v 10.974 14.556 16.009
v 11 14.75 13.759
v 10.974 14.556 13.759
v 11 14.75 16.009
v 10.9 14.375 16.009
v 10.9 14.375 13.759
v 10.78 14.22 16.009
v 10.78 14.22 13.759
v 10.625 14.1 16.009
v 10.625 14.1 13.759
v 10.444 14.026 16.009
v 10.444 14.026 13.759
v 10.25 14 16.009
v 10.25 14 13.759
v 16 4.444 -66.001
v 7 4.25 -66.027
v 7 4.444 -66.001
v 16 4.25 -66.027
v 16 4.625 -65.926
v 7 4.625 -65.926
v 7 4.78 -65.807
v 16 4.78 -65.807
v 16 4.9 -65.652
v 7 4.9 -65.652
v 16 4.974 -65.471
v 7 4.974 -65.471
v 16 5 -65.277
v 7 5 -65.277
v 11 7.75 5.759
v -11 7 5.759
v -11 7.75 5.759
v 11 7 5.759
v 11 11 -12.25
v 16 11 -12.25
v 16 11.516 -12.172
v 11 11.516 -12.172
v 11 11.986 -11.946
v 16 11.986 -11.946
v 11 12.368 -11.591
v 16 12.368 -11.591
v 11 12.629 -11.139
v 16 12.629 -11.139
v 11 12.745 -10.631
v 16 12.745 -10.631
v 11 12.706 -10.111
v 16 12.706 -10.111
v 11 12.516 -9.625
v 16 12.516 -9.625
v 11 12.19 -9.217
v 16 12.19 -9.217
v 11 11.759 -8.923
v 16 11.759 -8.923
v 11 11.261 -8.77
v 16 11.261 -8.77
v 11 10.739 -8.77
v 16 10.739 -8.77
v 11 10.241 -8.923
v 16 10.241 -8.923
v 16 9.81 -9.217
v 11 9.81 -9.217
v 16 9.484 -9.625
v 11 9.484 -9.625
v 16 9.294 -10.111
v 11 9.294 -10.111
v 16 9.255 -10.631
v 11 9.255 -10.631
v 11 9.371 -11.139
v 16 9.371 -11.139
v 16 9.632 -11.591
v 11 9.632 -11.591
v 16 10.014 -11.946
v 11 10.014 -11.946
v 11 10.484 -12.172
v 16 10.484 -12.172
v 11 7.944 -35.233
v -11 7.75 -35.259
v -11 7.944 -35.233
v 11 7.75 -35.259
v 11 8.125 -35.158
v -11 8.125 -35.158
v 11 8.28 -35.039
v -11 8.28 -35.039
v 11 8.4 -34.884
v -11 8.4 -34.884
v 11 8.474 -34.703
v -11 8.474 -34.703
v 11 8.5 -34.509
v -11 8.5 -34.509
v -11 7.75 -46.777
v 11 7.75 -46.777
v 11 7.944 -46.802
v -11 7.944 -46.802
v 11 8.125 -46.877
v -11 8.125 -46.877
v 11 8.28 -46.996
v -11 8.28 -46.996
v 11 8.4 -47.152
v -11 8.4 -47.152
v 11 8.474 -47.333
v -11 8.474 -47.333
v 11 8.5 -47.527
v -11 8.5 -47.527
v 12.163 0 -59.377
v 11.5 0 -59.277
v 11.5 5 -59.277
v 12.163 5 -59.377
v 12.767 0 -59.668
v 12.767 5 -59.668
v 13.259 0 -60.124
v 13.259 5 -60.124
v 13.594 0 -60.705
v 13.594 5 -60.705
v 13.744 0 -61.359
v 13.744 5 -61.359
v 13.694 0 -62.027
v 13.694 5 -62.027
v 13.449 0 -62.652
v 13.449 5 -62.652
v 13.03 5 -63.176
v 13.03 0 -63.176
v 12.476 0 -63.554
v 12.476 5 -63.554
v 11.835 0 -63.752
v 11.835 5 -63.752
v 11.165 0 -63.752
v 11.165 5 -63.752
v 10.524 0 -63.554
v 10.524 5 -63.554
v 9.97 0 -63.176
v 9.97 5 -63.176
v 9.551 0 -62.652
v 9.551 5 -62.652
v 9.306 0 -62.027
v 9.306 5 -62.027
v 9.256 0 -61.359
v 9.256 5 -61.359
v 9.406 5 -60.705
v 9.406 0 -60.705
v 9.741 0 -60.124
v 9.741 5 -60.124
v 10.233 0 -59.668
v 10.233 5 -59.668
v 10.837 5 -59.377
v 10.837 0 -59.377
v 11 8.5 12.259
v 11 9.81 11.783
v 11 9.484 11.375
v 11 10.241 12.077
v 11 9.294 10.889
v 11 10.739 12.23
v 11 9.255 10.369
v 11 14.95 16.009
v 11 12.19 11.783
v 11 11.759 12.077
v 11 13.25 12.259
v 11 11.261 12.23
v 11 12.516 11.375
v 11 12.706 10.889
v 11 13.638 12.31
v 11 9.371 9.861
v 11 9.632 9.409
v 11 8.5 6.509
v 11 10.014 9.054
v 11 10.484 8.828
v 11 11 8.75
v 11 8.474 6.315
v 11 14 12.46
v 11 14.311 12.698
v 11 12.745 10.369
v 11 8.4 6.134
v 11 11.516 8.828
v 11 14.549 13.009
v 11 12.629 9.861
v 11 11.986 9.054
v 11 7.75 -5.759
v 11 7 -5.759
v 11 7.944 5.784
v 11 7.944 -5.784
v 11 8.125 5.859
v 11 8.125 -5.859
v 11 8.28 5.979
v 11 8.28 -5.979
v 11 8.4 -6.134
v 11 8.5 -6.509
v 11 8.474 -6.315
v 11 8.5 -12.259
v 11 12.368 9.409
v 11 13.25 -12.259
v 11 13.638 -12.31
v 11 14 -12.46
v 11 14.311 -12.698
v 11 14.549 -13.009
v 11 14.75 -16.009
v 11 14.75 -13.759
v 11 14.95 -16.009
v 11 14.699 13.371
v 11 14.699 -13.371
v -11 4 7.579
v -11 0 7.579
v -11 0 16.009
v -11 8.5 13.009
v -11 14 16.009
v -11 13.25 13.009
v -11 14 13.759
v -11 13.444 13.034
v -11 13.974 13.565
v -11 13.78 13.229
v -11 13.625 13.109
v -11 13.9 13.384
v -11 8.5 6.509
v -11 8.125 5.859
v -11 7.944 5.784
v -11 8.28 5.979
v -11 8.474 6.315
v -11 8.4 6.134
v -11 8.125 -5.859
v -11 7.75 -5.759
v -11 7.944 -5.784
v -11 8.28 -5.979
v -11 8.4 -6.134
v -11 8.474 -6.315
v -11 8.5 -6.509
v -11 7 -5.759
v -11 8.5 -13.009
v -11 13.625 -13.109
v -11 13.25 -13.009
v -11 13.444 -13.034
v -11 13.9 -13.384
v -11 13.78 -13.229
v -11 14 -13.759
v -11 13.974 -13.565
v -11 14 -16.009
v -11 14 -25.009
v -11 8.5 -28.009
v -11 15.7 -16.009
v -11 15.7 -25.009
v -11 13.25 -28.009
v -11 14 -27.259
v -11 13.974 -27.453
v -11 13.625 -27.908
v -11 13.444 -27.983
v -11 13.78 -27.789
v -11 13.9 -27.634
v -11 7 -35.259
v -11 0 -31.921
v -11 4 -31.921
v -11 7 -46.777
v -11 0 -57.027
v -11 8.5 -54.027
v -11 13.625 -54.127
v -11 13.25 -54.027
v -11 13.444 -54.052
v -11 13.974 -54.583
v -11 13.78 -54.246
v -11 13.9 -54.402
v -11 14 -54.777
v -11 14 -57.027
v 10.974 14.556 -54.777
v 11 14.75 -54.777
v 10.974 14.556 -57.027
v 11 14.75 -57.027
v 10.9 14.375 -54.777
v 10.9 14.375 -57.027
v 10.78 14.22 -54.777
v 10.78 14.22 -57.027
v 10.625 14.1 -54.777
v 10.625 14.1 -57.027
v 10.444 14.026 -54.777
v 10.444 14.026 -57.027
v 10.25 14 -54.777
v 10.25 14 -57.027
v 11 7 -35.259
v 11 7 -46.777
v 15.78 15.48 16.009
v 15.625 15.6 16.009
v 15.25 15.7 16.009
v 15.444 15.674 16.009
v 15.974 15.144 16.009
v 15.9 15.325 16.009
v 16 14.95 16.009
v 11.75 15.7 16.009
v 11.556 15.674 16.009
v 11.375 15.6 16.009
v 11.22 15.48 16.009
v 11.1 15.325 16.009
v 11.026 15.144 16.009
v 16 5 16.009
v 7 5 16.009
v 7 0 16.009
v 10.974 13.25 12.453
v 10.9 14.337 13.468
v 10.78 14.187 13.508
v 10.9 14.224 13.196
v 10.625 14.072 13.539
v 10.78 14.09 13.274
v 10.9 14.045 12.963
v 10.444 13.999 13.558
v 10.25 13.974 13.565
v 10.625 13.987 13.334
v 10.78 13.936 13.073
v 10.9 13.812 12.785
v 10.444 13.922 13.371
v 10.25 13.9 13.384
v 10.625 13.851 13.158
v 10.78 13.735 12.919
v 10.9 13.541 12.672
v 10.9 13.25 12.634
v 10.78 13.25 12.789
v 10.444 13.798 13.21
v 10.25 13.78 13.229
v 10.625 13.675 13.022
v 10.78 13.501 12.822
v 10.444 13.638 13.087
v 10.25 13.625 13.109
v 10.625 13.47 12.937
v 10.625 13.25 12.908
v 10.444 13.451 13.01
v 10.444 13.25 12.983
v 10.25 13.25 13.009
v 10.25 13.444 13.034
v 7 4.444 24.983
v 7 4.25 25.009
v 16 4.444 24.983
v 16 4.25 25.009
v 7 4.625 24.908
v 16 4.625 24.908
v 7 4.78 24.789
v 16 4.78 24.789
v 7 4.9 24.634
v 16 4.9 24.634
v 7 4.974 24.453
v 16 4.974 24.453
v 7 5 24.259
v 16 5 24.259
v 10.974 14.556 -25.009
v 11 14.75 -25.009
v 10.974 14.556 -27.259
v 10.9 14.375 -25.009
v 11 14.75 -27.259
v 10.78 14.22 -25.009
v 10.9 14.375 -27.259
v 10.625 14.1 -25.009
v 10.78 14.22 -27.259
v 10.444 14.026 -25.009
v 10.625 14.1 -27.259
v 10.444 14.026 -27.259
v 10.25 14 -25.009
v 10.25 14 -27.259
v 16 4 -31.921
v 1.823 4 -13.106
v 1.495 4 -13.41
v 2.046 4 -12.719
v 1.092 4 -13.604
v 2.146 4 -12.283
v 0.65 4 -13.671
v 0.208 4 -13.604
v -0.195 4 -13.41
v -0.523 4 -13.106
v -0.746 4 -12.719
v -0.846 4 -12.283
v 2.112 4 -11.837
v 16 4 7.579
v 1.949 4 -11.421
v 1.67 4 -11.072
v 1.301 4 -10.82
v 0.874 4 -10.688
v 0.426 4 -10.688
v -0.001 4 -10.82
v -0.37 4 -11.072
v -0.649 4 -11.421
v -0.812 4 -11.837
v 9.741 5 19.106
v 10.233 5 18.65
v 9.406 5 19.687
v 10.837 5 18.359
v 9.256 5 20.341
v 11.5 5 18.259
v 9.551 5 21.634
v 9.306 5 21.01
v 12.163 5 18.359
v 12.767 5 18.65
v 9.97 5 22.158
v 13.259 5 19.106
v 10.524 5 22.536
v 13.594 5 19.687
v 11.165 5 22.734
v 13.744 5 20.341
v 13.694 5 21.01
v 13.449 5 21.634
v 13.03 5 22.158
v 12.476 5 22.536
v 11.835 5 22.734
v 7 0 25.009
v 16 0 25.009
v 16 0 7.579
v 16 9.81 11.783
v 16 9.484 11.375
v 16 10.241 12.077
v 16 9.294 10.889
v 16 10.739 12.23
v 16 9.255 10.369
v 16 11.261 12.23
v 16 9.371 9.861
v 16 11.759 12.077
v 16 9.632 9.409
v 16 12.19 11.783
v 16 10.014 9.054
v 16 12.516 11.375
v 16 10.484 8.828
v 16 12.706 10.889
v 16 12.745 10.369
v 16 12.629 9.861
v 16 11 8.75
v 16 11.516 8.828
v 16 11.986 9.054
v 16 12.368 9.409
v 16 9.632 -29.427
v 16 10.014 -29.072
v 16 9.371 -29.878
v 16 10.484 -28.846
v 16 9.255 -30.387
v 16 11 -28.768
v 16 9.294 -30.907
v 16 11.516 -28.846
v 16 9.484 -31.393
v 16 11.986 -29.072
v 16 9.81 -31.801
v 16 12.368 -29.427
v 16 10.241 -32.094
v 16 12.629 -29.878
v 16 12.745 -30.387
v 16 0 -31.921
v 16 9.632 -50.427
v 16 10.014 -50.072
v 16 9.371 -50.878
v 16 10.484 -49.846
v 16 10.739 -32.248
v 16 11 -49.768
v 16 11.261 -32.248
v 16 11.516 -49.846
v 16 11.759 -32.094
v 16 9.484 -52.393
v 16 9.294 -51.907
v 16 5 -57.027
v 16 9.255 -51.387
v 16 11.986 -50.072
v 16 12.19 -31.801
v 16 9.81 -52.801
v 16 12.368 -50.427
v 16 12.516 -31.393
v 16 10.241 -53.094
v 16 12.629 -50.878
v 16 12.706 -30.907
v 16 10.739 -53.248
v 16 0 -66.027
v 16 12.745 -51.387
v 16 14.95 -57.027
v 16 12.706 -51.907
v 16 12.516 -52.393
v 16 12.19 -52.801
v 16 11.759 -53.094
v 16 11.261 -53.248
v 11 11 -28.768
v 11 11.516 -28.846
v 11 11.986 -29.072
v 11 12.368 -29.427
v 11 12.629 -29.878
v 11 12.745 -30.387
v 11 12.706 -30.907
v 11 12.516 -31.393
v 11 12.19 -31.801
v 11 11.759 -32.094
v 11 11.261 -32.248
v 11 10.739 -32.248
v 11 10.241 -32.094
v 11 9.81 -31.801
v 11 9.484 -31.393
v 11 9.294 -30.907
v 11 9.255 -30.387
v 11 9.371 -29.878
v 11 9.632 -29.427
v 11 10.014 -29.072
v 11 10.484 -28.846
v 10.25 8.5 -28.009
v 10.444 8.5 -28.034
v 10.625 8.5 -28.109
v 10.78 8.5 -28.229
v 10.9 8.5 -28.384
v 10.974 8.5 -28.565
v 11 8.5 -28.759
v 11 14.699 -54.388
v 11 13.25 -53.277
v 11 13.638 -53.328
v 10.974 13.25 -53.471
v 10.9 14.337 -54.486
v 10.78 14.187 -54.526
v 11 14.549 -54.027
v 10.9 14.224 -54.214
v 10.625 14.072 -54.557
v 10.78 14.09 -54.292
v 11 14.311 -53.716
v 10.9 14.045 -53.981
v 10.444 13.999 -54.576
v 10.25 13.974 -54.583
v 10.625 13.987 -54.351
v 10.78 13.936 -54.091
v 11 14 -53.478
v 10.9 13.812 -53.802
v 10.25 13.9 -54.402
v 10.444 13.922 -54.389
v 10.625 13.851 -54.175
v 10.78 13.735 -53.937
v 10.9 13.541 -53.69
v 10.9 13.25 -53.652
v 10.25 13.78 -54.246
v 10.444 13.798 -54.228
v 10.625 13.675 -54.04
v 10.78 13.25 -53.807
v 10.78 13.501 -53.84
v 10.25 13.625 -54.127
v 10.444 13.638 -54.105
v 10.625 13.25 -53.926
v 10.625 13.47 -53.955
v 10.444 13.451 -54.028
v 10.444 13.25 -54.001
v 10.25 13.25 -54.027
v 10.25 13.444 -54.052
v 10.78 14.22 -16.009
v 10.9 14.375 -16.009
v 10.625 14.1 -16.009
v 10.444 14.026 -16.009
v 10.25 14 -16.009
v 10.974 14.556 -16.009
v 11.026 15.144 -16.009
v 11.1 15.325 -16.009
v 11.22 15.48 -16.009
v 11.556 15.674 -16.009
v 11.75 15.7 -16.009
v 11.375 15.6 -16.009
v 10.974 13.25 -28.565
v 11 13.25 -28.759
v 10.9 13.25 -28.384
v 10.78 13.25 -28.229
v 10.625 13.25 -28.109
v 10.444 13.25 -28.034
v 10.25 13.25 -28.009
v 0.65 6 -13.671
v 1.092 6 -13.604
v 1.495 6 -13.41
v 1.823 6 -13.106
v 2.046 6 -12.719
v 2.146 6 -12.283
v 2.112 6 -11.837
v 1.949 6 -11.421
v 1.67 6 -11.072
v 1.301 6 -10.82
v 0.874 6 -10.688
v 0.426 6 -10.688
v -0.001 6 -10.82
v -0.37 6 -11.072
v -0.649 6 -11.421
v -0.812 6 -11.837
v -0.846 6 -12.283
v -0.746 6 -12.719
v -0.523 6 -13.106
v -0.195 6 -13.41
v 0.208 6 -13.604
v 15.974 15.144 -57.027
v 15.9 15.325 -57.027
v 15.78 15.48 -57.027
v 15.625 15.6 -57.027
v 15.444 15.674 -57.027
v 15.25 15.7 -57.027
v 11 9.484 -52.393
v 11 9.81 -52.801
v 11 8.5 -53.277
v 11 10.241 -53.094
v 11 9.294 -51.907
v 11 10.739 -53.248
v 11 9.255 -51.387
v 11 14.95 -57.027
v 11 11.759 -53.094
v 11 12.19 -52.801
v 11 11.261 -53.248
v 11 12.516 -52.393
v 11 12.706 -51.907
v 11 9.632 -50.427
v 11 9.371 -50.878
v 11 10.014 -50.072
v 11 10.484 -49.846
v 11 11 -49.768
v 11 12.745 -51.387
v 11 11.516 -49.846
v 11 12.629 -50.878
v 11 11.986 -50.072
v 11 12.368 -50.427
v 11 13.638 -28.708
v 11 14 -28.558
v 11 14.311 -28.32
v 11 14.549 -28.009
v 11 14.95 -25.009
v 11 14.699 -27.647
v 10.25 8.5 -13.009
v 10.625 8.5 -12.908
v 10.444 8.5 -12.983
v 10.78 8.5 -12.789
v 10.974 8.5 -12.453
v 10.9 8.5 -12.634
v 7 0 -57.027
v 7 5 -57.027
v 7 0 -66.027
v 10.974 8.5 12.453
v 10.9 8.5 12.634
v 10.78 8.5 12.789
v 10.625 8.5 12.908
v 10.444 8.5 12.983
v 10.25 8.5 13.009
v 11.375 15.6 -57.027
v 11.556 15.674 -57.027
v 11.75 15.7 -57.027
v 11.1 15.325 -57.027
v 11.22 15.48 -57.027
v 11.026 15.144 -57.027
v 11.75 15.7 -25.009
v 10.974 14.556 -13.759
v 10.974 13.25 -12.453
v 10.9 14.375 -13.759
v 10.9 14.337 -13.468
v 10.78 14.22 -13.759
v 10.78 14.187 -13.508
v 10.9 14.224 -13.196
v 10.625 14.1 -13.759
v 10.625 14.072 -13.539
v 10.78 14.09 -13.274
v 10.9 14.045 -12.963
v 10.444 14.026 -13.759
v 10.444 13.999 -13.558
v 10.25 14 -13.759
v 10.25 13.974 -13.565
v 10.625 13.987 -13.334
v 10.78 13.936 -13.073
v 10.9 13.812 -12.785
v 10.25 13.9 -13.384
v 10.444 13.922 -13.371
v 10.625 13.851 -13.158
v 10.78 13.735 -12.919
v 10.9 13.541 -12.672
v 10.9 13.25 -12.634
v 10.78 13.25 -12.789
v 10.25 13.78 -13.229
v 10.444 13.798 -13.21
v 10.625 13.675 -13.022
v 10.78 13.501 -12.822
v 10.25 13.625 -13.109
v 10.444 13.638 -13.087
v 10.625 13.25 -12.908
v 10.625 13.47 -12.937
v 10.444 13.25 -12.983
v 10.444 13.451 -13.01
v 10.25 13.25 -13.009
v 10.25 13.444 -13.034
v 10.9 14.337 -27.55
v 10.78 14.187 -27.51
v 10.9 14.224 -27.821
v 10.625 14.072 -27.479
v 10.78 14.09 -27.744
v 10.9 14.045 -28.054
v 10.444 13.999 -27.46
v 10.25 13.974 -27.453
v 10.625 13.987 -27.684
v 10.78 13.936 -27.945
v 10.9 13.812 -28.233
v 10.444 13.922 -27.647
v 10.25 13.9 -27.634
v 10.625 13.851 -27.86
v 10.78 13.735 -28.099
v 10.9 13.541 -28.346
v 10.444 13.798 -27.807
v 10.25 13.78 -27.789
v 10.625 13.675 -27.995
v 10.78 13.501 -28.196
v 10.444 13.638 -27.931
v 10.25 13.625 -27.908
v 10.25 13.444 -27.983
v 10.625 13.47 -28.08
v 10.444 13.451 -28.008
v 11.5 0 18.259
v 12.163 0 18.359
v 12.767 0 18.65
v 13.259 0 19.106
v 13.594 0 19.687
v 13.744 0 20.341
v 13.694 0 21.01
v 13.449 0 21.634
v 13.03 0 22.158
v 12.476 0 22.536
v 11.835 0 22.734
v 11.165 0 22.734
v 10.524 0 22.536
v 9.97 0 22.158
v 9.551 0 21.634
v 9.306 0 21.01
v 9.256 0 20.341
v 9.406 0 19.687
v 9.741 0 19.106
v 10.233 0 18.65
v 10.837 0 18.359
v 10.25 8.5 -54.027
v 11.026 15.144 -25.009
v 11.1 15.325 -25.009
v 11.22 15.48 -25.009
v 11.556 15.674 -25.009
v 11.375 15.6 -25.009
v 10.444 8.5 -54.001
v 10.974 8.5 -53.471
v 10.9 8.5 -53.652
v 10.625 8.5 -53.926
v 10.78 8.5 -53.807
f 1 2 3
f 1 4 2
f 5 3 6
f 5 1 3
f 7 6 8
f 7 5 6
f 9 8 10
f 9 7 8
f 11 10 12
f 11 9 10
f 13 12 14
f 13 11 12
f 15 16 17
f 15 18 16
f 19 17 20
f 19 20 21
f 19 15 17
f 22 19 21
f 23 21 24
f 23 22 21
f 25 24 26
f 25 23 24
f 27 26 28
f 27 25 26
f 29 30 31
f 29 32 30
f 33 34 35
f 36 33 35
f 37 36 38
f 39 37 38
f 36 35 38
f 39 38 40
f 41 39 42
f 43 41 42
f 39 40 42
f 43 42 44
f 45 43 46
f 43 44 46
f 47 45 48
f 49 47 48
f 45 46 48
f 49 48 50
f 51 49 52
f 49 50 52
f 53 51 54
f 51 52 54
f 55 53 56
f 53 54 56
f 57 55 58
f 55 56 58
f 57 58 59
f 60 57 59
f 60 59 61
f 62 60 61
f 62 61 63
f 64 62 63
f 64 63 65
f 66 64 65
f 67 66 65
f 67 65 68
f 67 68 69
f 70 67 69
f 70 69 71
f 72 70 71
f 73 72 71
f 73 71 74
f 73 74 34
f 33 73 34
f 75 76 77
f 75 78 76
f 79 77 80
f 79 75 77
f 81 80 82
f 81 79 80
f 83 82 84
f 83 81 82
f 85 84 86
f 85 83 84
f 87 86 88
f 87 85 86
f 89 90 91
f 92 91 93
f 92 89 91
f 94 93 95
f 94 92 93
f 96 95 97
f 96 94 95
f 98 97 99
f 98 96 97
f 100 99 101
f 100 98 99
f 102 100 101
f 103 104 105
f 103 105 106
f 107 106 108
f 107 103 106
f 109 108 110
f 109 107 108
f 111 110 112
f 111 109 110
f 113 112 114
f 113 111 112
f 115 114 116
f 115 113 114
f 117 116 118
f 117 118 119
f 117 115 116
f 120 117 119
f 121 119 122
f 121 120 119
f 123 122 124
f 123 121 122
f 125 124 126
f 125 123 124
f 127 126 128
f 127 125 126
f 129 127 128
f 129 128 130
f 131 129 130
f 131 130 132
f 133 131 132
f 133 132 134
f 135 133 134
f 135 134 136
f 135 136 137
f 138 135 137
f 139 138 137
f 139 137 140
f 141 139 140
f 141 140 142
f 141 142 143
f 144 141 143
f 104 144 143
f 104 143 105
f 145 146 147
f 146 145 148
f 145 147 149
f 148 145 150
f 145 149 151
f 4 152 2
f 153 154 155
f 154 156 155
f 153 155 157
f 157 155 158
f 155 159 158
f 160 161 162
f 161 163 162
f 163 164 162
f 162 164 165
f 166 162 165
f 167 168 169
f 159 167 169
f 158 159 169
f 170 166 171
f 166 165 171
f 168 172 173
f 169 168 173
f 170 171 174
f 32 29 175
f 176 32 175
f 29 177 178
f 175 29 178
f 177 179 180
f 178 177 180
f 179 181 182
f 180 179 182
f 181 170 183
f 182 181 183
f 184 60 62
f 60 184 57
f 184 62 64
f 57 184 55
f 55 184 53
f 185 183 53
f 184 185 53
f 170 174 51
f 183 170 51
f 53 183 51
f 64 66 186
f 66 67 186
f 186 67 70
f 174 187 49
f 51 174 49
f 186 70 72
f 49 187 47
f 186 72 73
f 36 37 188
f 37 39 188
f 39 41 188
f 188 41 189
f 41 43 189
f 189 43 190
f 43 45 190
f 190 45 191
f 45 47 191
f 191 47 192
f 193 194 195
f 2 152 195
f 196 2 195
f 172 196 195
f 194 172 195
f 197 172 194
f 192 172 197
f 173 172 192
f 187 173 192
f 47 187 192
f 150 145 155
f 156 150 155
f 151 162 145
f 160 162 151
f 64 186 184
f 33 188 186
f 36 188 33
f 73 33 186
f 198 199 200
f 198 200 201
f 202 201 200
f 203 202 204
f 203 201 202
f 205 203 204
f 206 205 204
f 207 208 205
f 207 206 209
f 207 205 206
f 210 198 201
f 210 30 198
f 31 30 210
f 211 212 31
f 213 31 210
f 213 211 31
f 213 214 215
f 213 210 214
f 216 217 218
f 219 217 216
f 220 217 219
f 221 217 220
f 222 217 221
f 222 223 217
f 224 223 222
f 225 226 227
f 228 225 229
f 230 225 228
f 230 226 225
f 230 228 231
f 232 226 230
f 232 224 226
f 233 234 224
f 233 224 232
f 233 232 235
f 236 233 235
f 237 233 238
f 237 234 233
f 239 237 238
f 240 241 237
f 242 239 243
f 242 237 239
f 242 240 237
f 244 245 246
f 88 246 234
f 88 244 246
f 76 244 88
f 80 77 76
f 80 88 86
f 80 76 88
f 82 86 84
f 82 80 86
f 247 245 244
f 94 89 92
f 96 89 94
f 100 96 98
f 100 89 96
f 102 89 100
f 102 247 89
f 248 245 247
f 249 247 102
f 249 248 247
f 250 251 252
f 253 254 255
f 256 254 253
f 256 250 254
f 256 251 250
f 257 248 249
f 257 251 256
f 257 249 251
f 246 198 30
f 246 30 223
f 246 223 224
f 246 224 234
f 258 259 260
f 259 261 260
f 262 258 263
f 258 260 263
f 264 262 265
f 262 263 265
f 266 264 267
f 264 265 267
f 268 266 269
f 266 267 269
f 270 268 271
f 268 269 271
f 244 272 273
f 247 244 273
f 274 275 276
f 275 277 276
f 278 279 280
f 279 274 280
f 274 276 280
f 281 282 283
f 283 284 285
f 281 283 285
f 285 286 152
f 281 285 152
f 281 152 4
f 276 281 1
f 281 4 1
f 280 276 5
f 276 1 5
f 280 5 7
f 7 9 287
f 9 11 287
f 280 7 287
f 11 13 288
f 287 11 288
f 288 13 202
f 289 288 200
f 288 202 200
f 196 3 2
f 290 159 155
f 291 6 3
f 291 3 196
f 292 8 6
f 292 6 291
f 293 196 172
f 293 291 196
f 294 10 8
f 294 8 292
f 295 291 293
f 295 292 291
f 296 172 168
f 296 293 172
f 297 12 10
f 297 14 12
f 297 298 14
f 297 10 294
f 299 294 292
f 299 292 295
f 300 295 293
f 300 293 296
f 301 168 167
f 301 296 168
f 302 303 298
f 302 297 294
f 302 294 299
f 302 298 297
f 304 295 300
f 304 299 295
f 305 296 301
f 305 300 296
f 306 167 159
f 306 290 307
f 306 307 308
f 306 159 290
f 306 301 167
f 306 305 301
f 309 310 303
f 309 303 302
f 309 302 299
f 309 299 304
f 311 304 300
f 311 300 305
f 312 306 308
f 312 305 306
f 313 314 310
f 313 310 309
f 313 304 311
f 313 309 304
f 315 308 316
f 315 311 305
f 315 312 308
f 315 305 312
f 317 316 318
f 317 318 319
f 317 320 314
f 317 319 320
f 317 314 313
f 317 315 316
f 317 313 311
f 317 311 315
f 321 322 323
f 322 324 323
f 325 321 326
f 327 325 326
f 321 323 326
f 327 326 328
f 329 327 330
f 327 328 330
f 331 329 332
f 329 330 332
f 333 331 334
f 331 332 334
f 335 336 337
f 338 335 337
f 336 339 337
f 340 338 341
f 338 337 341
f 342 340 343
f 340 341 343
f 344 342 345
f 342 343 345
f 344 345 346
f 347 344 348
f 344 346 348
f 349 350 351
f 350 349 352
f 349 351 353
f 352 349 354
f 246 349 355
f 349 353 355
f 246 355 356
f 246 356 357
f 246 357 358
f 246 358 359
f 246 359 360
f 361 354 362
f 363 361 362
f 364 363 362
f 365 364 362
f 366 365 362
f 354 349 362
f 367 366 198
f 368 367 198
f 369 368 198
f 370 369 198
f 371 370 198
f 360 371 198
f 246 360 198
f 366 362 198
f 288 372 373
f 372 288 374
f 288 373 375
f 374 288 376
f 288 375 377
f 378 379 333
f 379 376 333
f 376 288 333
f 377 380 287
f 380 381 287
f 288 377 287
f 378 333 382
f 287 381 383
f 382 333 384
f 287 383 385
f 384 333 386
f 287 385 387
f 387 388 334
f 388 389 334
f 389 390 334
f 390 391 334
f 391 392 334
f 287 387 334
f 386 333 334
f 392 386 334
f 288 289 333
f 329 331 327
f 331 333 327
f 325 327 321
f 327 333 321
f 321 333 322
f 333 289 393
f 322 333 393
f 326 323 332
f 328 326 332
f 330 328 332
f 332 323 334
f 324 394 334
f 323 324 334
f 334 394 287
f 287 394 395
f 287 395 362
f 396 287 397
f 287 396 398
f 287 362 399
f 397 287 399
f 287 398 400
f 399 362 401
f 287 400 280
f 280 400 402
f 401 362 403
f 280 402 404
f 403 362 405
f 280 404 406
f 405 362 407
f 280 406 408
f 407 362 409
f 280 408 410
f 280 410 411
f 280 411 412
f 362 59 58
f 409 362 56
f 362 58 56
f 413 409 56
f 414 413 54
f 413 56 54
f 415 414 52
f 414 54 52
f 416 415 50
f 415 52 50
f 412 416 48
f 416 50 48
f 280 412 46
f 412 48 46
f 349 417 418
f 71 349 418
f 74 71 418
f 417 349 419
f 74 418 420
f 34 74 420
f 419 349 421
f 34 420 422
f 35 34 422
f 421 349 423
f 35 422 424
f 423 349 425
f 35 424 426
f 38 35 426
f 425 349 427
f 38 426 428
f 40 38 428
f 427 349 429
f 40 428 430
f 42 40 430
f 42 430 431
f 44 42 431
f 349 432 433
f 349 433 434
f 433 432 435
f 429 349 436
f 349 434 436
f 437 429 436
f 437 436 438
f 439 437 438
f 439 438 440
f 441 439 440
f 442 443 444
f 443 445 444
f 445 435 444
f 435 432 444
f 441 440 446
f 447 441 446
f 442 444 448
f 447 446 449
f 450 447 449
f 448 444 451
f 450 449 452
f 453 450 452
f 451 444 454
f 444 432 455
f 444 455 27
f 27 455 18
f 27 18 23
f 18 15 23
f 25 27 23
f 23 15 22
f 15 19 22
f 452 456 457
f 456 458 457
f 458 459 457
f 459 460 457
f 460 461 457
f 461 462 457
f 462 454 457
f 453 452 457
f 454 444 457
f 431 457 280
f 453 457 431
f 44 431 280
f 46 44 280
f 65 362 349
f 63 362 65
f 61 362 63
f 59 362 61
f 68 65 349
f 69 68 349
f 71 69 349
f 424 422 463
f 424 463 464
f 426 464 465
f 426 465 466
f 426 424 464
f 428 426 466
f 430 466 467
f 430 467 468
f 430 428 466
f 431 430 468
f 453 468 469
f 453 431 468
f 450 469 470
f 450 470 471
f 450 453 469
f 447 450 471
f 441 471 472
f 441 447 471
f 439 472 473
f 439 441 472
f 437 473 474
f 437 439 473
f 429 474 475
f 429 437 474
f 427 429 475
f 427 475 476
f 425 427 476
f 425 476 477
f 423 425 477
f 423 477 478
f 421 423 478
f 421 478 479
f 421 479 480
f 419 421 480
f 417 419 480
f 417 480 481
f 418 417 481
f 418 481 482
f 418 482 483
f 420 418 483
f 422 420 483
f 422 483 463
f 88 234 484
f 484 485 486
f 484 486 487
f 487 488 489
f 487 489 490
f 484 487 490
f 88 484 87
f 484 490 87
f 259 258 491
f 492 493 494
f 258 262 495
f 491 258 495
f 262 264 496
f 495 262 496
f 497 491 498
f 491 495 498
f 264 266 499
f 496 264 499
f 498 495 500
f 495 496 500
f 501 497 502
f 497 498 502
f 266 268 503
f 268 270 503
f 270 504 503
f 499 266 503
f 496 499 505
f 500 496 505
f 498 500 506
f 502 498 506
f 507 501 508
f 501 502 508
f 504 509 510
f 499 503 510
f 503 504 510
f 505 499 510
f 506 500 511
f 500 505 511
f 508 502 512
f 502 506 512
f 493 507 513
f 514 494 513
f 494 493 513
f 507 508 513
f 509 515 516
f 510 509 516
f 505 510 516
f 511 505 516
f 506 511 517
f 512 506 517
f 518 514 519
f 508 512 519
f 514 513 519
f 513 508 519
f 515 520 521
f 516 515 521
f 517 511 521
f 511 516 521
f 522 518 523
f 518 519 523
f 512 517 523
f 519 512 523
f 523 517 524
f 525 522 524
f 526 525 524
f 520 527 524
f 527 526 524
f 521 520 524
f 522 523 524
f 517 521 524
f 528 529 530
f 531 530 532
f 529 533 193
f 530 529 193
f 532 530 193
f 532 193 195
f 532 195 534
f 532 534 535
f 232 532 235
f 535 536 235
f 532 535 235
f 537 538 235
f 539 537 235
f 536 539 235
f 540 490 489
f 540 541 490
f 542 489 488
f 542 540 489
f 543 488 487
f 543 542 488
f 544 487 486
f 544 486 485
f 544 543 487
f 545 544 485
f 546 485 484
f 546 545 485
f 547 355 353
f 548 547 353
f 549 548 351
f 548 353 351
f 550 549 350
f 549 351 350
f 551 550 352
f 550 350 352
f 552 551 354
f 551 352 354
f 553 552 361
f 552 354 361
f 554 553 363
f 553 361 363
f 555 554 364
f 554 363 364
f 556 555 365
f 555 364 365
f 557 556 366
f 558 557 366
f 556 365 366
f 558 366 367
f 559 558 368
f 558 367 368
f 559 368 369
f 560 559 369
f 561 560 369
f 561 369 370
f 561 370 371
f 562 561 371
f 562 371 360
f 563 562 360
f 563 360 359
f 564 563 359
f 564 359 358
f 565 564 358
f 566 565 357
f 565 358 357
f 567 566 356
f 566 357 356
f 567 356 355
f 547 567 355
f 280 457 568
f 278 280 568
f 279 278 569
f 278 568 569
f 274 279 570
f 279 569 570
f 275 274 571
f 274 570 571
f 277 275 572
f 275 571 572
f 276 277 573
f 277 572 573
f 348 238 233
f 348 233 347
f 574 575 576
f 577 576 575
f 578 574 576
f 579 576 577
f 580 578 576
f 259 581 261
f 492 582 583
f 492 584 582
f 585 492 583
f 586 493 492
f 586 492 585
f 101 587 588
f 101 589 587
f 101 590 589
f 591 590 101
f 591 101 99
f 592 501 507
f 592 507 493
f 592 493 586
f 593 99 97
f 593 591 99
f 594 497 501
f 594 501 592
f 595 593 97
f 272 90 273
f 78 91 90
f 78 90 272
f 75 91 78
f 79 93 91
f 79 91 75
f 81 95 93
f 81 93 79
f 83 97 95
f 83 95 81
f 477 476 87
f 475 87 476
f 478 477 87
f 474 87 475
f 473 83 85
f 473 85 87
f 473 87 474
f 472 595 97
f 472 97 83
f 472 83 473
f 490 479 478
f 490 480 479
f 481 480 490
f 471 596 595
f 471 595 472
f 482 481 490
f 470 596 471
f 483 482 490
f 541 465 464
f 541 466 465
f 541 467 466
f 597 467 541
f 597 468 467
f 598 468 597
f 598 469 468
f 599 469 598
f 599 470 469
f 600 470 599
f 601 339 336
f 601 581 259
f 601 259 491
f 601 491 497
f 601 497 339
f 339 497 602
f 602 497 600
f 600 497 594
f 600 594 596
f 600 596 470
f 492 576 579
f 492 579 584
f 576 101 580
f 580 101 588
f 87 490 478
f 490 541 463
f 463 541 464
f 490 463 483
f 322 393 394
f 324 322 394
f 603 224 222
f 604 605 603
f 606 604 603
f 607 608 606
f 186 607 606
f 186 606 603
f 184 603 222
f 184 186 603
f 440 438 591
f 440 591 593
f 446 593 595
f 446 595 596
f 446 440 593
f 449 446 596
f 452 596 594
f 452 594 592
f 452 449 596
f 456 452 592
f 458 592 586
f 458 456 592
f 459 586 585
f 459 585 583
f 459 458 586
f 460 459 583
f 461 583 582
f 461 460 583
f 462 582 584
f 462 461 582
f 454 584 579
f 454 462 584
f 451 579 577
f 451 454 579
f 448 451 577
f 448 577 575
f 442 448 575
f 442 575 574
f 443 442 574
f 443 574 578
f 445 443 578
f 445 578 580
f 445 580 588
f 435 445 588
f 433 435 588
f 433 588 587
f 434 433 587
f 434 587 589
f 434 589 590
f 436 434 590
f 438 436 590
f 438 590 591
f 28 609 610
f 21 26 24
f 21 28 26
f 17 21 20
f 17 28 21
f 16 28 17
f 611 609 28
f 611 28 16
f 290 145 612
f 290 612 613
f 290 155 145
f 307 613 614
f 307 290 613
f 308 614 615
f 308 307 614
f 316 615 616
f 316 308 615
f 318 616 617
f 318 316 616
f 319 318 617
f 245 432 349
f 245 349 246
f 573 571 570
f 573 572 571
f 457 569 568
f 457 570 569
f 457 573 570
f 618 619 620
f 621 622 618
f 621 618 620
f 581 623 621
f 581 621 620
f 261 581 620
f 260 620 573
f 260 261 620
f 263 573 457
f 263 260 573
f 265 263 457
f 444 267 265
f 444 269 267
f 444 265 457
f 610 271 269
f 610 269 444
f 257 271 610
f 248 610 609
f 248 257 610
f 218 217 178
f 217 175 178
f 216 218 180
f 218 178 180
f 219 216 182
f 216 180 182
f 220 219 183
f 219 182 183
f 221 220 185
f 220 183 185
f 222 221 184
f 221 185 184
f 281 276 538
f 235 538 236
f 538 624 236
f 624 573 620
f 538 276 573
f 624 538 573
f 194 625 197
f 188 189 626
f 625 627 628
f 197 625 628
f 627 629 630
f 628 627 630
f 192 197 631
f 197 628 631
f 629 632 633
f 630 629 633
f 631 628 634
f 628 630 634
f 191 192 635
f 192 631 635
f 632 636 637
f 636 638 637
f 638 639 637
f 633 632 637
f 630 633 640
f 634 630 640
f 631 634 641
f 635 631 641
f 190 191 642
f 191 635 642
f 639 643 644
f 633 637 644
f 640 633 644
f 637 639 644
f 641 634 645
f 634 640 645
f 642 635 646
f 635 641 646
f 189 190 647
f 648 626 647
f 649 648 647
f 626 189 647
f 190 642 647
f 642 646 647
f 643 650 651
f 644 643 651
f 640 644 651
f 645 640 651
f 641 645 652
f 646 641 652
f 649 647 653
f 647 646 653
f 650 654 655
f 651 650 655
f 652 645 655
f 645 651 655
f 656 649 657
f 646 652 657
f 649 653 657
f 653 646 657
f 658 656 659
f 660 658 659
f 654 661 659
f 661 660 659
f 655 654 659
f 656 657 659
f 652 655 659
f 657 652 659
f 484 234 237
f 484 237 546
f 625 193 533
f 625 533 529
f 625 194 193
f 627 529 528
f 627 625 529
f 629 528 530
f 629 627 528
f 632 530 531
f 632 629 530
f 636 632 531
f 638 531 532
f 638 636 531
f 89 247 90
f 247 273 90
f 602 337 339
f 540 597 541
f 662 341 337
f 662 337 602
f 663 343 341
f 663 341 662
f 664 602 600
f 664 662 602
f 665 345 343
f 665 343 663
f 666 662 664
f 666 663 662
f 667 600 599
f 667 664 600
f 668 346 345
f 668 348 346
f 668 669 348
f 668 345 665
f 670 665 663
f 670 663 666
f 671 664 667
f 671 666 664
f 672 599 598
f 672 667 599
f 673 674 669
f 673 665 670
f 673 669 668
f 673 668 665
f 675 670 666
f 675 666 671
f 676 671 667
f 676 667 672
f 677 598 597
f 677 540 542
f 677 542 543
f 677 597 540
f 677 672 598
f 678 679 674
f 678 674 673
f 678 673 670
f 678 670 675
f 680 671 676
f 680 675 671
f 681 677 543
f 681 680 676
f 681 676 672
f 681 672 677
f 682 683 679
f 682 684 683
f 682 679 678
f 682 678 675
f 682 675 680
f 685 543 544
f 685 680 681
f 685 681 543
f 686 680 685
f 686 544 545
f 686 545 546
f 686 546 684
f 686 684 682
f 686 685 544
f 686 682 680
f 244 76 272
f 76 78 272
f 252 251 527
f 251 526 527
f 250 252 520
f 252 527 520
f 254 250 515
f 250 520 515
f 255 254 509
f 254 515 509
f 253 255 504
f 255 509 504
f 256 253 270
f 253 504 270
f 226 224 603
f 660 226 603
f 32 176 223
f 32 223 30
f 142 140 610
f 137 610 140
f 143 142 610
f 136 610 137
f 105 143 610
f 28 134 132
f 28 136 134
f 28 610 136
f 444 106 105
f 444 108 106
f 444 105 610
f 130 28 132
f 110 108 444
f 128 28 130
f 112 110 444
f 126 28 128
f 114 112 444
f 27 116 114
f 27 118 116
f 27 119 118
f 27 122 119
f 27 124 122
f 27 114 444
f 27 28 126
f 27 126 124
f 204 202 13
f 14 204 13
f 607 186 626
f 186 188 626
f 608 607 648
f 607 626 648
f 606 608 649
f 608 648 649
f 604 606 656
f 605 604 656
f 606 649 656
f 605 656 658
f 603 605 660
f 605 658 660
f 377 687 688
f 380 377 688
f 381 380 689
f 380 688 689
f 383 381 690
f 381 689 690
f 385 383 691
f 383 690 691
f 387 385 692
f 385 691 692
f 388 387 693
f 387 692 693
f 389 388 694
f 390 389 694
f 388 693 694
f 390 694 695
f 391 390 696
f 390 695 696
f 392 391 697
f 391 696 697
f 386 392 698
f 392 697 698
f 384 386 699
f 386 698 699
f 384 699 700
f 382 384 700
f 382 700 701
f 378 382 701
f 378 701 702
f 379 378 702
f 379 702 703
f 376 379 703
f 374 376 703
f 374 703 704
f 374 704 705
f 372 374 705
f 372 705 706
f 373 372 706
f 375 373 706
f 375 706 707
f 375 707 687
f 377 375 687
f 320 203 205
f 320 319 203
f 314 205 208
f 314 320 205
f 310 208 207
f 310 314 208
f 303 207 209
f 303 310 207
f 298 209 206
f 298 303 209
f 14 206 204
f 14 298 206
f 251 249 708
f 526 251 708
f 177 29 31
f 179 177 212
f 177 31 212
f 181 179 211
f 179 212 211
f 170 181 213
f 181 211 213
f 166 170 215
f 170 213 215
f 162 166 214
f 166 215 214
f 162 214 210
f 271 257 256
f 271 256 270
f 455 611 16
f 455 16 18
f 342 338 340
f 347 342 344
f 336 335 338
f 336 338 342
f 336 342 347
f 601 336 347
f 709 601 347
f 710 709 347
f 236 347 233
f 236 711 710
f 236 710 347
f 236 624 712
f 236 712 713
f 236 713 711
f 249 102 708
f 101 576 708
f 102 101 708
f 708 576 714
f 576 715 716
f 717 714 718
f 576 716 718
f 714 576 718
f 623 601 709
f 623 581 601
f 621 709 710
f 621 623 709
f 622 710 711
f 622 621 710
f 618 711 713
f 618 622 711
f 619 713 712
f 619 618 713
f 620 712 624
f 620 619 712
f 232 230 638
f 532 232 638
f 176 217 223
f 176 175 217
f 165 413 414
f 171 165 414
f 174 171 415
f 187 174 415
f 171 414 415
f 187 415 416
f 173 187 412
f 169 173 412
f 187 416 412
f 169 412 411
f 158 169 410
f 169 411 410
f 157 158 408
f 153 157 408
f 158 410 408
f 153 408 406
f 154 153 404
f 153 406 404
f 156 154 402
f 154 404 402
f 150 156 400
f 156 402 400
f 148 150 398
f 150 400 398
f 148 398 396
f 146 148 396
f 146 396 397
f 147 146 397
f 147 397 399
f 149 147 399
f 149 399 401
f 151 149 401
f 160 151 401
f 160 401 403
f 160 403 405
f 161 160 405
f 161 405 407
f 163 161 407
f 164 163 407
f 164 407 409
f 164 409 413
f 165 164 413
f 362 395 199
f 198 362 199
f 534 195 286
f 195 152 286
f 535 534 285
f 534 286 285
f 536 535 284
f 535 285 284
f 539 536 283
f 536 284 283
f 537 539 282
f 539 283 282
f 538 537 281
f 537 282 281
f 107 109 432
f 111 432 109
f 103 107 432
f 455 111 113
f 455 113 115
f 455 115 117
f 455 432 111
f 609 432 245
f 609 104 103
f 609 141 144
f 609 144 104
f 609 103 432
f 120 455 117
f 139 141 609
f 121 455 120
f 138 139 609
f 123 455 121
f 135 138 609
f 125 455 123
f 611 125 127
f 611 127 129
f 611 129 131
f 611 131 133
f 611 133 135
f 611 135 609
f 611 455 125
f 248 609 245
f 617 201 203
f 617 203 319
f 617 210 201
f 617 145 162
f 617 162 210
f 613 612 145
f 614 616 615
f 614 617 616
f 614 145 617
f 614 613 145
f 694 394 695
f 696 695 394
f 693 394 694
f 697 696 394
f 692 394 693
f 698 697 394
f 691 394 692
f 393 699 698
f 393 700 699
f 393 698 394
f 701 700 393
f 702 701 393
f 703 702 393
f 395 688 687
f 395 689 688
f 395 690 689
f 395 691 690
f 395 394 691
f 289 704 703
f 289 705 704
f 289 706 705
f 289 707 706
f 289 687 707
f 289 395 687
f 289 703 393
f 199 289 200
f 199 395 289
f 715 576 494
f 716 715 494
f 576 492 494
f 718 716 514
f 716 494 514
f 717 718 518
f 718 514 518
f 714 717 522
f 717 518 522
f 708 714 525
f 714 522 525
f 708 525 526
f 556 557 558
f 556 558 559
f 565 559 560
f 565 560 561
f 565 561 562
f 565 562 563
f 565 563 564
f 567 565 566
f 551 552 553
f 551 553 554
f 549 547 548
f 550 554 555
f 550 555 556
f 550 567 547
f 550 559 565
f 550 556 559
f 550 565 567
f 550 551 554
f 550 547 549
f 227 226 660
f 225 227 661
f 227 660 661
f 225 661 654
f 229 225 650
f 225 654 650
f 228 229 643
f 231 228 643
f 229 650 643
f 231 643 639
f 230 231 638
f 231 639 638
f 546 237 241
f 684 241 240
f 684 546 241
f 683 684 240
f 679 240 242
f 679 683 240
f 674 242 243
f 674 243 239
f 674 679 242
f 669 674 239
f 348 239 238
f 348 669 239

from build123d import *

# Parameters (mm, degrees)
BOSS_EXTRUDE1_DEPTH = 11
SKETCH3_W           = 22
SKETCH3_H           = 3
BOSS_EXTRUDE2_DEPTH = 14
BOSS_EXTRUDE3_DEPTH = 5
SKETCH5_R           = 1.75
CUT_EXTRUDE1_DEPTH  = 36.096650541
SKETCH6_W           = 9
SKETCH6_H           = 9
BOSS_EXTRUDE4_DEPTH = 5
SKETCH10_R          = 2.25
CUT_EXTRUDE2_DEPTH  = 34.584744739
SKETCH8_W           = 27
SKETCH8_H           = 15.7
BOSS_EXTRUDE5_DEPTH = 4.5
FILLET1_R           = 0.75
CUT_EXTRUDE3_DEPTH  = 4
SKETCH12_R          = 1.5
CUT_EXTRUDE4_DEPTH  = 2


with BuildPart() as part:
    # Sketch1 → Boss-Extrude1 (new, symmetric)
    with BuildSketch(Plane(origin=(0, 0, 0), x_dir=(0, 0, -1), z_dir=(1, 0, 0))):
        Polygon((-13.0089, 0), (13.0089, 0), (13.0089, 8.5), (5.7589, 8.5), (5.7589, 7), (-5.7589, 7), (-5.7589, 8.5), (-13.0089, 8.5), align=None)
    extrude(amount=BOSS_EXTRUDE1_DEPTH, both=True)

    # Sketch3 → Boss-Extrude2 (add)
    with BuildSketch(Plane.XZ):
        with Locations((0, -14.5089)):
            Rectangle(SKETCH3_W, SKETCH3_H)
        with Locations((0, 14.5089)):
            Rectangle(SKETCH3_W, SKETCH3_H)
    extrude(amount=-BOSS_EXTRUDE2_DEPTH)

    # Sketch4 → Boss-Extrude3 (add)
    with BuildSketch(Plane(origin=(11, 0, 0), x_dir=(0, 0, -1), z_dir=(1, 0, 0))):
        Polygon((-8.8, 15.7), (-16.0089, 15.7), (-16.0089, 0), (16.0089, 0), (16.0089, 15.7), align=None)
    extrude(amount=BOSS_EXTRUDE3_DEPTH)

    # Sketch5 → Cut-Extrude1 (cut, through all)
    with BuildSketch(Plane(origin=(16, 0, 0), x_dir=(0, 0, -1), z_dir=(1, 0, 0))):
        with Locations((-10.5, 11)):
            Circle(SKETCH5_R)
        with Locations((10.5, 11)):
            Circle(SKETCH5_R)
    extrude(amount=-CUT_EXTRUDE1_DEPTH, mode=Mode.SUBTRACT)

    # Sketch6 → Boss-Extrude4 (add)
    with BuildSketch(Plane.XZ):
        with Locations((11.5, 20.5089)):
            Rectangle(SKETCH6_W, SKETCH6_H)
    extrude(amount=-BOSS_EXTRUDE4_DEPTH)

    # Sketch10 → Cut-Extrude2 (cut, through all)
    with BuildSketch(Plane.XZ):
        with Locations(Location((11.5, 20.5089, 0), (0, 0, 270))):
            Circle(SKETCH10_R)
    extrude(amount=-CUT_EXTRUDE2_DEPTH, mode=Mode.SUBTRACT)

    # Sketch8 → Boss-Extrude5 (add)
    with BuildSketch(Plane(origin=(0, 0, -16.0089), x_dir=(-1, 0, 0), z_dir=(0, 0, -1))):
        with Locations((-2.5, 7.85)):
            Rectangle(SKETCH8_W, SKETCH8_H)
    extrude(amount=BOSS_EXTRUDE5_DEPTH)

    # Fillet1
    fillet1_edges = [part.edges().sort_by_distance(p)[0] for p in [
        (0, 8.5, 5.7589),
        (0, 8.5, -5.7589),
        (0, 14, -13.0089),
        (11, 14, -14.5089),
        (11, 11.25, -13.0089),
        (11, 14, 14.5089),
        (11, 11.25, 13.0089),
        (0, 14, 13.0089),
        (11, 15.7, 0),
        (16, 15.7, -2.25),
        (11.5, 5, 25.0089),
    ]]
    fillet(fillet1_edges, radius=FILLET1_R)

    # Mirror6: part across plane


with BuildPart() as part_1:
    add(part.part)
    add(part.part.mirror(Plane(origin=(0, 0, -20.5089), x_dir=(1, 0, 0), z_dir=(0, 0, -1))))

    # Sketch11 → Cut-Extrude3 (cut)
    with BuildSketch(Plane.XZ):
        Polygon((0.65, 7.5789), (16, 7.5789), (16, -31.9211), (-11, -31.9211), (-11, 7.5789), align=None)
    extrude(amount=-CUT_EXTRUDE3_DEPTH, mode=Mode.SUBTRACT)

    # Sketch12 → Cut-Extrude4 (cut)
    with BuildSketch(Plane.XZ.offset(-4)):
        with Locations(Location((0.65, -12.1711, 0), (0, 0, 270))):
            Circle(SKETCH12_R)
    extrude(amount=-CUT_EXTRUDE4_DEPTH, mode=Mode.SUBTRACT)


solid = part_1.part
